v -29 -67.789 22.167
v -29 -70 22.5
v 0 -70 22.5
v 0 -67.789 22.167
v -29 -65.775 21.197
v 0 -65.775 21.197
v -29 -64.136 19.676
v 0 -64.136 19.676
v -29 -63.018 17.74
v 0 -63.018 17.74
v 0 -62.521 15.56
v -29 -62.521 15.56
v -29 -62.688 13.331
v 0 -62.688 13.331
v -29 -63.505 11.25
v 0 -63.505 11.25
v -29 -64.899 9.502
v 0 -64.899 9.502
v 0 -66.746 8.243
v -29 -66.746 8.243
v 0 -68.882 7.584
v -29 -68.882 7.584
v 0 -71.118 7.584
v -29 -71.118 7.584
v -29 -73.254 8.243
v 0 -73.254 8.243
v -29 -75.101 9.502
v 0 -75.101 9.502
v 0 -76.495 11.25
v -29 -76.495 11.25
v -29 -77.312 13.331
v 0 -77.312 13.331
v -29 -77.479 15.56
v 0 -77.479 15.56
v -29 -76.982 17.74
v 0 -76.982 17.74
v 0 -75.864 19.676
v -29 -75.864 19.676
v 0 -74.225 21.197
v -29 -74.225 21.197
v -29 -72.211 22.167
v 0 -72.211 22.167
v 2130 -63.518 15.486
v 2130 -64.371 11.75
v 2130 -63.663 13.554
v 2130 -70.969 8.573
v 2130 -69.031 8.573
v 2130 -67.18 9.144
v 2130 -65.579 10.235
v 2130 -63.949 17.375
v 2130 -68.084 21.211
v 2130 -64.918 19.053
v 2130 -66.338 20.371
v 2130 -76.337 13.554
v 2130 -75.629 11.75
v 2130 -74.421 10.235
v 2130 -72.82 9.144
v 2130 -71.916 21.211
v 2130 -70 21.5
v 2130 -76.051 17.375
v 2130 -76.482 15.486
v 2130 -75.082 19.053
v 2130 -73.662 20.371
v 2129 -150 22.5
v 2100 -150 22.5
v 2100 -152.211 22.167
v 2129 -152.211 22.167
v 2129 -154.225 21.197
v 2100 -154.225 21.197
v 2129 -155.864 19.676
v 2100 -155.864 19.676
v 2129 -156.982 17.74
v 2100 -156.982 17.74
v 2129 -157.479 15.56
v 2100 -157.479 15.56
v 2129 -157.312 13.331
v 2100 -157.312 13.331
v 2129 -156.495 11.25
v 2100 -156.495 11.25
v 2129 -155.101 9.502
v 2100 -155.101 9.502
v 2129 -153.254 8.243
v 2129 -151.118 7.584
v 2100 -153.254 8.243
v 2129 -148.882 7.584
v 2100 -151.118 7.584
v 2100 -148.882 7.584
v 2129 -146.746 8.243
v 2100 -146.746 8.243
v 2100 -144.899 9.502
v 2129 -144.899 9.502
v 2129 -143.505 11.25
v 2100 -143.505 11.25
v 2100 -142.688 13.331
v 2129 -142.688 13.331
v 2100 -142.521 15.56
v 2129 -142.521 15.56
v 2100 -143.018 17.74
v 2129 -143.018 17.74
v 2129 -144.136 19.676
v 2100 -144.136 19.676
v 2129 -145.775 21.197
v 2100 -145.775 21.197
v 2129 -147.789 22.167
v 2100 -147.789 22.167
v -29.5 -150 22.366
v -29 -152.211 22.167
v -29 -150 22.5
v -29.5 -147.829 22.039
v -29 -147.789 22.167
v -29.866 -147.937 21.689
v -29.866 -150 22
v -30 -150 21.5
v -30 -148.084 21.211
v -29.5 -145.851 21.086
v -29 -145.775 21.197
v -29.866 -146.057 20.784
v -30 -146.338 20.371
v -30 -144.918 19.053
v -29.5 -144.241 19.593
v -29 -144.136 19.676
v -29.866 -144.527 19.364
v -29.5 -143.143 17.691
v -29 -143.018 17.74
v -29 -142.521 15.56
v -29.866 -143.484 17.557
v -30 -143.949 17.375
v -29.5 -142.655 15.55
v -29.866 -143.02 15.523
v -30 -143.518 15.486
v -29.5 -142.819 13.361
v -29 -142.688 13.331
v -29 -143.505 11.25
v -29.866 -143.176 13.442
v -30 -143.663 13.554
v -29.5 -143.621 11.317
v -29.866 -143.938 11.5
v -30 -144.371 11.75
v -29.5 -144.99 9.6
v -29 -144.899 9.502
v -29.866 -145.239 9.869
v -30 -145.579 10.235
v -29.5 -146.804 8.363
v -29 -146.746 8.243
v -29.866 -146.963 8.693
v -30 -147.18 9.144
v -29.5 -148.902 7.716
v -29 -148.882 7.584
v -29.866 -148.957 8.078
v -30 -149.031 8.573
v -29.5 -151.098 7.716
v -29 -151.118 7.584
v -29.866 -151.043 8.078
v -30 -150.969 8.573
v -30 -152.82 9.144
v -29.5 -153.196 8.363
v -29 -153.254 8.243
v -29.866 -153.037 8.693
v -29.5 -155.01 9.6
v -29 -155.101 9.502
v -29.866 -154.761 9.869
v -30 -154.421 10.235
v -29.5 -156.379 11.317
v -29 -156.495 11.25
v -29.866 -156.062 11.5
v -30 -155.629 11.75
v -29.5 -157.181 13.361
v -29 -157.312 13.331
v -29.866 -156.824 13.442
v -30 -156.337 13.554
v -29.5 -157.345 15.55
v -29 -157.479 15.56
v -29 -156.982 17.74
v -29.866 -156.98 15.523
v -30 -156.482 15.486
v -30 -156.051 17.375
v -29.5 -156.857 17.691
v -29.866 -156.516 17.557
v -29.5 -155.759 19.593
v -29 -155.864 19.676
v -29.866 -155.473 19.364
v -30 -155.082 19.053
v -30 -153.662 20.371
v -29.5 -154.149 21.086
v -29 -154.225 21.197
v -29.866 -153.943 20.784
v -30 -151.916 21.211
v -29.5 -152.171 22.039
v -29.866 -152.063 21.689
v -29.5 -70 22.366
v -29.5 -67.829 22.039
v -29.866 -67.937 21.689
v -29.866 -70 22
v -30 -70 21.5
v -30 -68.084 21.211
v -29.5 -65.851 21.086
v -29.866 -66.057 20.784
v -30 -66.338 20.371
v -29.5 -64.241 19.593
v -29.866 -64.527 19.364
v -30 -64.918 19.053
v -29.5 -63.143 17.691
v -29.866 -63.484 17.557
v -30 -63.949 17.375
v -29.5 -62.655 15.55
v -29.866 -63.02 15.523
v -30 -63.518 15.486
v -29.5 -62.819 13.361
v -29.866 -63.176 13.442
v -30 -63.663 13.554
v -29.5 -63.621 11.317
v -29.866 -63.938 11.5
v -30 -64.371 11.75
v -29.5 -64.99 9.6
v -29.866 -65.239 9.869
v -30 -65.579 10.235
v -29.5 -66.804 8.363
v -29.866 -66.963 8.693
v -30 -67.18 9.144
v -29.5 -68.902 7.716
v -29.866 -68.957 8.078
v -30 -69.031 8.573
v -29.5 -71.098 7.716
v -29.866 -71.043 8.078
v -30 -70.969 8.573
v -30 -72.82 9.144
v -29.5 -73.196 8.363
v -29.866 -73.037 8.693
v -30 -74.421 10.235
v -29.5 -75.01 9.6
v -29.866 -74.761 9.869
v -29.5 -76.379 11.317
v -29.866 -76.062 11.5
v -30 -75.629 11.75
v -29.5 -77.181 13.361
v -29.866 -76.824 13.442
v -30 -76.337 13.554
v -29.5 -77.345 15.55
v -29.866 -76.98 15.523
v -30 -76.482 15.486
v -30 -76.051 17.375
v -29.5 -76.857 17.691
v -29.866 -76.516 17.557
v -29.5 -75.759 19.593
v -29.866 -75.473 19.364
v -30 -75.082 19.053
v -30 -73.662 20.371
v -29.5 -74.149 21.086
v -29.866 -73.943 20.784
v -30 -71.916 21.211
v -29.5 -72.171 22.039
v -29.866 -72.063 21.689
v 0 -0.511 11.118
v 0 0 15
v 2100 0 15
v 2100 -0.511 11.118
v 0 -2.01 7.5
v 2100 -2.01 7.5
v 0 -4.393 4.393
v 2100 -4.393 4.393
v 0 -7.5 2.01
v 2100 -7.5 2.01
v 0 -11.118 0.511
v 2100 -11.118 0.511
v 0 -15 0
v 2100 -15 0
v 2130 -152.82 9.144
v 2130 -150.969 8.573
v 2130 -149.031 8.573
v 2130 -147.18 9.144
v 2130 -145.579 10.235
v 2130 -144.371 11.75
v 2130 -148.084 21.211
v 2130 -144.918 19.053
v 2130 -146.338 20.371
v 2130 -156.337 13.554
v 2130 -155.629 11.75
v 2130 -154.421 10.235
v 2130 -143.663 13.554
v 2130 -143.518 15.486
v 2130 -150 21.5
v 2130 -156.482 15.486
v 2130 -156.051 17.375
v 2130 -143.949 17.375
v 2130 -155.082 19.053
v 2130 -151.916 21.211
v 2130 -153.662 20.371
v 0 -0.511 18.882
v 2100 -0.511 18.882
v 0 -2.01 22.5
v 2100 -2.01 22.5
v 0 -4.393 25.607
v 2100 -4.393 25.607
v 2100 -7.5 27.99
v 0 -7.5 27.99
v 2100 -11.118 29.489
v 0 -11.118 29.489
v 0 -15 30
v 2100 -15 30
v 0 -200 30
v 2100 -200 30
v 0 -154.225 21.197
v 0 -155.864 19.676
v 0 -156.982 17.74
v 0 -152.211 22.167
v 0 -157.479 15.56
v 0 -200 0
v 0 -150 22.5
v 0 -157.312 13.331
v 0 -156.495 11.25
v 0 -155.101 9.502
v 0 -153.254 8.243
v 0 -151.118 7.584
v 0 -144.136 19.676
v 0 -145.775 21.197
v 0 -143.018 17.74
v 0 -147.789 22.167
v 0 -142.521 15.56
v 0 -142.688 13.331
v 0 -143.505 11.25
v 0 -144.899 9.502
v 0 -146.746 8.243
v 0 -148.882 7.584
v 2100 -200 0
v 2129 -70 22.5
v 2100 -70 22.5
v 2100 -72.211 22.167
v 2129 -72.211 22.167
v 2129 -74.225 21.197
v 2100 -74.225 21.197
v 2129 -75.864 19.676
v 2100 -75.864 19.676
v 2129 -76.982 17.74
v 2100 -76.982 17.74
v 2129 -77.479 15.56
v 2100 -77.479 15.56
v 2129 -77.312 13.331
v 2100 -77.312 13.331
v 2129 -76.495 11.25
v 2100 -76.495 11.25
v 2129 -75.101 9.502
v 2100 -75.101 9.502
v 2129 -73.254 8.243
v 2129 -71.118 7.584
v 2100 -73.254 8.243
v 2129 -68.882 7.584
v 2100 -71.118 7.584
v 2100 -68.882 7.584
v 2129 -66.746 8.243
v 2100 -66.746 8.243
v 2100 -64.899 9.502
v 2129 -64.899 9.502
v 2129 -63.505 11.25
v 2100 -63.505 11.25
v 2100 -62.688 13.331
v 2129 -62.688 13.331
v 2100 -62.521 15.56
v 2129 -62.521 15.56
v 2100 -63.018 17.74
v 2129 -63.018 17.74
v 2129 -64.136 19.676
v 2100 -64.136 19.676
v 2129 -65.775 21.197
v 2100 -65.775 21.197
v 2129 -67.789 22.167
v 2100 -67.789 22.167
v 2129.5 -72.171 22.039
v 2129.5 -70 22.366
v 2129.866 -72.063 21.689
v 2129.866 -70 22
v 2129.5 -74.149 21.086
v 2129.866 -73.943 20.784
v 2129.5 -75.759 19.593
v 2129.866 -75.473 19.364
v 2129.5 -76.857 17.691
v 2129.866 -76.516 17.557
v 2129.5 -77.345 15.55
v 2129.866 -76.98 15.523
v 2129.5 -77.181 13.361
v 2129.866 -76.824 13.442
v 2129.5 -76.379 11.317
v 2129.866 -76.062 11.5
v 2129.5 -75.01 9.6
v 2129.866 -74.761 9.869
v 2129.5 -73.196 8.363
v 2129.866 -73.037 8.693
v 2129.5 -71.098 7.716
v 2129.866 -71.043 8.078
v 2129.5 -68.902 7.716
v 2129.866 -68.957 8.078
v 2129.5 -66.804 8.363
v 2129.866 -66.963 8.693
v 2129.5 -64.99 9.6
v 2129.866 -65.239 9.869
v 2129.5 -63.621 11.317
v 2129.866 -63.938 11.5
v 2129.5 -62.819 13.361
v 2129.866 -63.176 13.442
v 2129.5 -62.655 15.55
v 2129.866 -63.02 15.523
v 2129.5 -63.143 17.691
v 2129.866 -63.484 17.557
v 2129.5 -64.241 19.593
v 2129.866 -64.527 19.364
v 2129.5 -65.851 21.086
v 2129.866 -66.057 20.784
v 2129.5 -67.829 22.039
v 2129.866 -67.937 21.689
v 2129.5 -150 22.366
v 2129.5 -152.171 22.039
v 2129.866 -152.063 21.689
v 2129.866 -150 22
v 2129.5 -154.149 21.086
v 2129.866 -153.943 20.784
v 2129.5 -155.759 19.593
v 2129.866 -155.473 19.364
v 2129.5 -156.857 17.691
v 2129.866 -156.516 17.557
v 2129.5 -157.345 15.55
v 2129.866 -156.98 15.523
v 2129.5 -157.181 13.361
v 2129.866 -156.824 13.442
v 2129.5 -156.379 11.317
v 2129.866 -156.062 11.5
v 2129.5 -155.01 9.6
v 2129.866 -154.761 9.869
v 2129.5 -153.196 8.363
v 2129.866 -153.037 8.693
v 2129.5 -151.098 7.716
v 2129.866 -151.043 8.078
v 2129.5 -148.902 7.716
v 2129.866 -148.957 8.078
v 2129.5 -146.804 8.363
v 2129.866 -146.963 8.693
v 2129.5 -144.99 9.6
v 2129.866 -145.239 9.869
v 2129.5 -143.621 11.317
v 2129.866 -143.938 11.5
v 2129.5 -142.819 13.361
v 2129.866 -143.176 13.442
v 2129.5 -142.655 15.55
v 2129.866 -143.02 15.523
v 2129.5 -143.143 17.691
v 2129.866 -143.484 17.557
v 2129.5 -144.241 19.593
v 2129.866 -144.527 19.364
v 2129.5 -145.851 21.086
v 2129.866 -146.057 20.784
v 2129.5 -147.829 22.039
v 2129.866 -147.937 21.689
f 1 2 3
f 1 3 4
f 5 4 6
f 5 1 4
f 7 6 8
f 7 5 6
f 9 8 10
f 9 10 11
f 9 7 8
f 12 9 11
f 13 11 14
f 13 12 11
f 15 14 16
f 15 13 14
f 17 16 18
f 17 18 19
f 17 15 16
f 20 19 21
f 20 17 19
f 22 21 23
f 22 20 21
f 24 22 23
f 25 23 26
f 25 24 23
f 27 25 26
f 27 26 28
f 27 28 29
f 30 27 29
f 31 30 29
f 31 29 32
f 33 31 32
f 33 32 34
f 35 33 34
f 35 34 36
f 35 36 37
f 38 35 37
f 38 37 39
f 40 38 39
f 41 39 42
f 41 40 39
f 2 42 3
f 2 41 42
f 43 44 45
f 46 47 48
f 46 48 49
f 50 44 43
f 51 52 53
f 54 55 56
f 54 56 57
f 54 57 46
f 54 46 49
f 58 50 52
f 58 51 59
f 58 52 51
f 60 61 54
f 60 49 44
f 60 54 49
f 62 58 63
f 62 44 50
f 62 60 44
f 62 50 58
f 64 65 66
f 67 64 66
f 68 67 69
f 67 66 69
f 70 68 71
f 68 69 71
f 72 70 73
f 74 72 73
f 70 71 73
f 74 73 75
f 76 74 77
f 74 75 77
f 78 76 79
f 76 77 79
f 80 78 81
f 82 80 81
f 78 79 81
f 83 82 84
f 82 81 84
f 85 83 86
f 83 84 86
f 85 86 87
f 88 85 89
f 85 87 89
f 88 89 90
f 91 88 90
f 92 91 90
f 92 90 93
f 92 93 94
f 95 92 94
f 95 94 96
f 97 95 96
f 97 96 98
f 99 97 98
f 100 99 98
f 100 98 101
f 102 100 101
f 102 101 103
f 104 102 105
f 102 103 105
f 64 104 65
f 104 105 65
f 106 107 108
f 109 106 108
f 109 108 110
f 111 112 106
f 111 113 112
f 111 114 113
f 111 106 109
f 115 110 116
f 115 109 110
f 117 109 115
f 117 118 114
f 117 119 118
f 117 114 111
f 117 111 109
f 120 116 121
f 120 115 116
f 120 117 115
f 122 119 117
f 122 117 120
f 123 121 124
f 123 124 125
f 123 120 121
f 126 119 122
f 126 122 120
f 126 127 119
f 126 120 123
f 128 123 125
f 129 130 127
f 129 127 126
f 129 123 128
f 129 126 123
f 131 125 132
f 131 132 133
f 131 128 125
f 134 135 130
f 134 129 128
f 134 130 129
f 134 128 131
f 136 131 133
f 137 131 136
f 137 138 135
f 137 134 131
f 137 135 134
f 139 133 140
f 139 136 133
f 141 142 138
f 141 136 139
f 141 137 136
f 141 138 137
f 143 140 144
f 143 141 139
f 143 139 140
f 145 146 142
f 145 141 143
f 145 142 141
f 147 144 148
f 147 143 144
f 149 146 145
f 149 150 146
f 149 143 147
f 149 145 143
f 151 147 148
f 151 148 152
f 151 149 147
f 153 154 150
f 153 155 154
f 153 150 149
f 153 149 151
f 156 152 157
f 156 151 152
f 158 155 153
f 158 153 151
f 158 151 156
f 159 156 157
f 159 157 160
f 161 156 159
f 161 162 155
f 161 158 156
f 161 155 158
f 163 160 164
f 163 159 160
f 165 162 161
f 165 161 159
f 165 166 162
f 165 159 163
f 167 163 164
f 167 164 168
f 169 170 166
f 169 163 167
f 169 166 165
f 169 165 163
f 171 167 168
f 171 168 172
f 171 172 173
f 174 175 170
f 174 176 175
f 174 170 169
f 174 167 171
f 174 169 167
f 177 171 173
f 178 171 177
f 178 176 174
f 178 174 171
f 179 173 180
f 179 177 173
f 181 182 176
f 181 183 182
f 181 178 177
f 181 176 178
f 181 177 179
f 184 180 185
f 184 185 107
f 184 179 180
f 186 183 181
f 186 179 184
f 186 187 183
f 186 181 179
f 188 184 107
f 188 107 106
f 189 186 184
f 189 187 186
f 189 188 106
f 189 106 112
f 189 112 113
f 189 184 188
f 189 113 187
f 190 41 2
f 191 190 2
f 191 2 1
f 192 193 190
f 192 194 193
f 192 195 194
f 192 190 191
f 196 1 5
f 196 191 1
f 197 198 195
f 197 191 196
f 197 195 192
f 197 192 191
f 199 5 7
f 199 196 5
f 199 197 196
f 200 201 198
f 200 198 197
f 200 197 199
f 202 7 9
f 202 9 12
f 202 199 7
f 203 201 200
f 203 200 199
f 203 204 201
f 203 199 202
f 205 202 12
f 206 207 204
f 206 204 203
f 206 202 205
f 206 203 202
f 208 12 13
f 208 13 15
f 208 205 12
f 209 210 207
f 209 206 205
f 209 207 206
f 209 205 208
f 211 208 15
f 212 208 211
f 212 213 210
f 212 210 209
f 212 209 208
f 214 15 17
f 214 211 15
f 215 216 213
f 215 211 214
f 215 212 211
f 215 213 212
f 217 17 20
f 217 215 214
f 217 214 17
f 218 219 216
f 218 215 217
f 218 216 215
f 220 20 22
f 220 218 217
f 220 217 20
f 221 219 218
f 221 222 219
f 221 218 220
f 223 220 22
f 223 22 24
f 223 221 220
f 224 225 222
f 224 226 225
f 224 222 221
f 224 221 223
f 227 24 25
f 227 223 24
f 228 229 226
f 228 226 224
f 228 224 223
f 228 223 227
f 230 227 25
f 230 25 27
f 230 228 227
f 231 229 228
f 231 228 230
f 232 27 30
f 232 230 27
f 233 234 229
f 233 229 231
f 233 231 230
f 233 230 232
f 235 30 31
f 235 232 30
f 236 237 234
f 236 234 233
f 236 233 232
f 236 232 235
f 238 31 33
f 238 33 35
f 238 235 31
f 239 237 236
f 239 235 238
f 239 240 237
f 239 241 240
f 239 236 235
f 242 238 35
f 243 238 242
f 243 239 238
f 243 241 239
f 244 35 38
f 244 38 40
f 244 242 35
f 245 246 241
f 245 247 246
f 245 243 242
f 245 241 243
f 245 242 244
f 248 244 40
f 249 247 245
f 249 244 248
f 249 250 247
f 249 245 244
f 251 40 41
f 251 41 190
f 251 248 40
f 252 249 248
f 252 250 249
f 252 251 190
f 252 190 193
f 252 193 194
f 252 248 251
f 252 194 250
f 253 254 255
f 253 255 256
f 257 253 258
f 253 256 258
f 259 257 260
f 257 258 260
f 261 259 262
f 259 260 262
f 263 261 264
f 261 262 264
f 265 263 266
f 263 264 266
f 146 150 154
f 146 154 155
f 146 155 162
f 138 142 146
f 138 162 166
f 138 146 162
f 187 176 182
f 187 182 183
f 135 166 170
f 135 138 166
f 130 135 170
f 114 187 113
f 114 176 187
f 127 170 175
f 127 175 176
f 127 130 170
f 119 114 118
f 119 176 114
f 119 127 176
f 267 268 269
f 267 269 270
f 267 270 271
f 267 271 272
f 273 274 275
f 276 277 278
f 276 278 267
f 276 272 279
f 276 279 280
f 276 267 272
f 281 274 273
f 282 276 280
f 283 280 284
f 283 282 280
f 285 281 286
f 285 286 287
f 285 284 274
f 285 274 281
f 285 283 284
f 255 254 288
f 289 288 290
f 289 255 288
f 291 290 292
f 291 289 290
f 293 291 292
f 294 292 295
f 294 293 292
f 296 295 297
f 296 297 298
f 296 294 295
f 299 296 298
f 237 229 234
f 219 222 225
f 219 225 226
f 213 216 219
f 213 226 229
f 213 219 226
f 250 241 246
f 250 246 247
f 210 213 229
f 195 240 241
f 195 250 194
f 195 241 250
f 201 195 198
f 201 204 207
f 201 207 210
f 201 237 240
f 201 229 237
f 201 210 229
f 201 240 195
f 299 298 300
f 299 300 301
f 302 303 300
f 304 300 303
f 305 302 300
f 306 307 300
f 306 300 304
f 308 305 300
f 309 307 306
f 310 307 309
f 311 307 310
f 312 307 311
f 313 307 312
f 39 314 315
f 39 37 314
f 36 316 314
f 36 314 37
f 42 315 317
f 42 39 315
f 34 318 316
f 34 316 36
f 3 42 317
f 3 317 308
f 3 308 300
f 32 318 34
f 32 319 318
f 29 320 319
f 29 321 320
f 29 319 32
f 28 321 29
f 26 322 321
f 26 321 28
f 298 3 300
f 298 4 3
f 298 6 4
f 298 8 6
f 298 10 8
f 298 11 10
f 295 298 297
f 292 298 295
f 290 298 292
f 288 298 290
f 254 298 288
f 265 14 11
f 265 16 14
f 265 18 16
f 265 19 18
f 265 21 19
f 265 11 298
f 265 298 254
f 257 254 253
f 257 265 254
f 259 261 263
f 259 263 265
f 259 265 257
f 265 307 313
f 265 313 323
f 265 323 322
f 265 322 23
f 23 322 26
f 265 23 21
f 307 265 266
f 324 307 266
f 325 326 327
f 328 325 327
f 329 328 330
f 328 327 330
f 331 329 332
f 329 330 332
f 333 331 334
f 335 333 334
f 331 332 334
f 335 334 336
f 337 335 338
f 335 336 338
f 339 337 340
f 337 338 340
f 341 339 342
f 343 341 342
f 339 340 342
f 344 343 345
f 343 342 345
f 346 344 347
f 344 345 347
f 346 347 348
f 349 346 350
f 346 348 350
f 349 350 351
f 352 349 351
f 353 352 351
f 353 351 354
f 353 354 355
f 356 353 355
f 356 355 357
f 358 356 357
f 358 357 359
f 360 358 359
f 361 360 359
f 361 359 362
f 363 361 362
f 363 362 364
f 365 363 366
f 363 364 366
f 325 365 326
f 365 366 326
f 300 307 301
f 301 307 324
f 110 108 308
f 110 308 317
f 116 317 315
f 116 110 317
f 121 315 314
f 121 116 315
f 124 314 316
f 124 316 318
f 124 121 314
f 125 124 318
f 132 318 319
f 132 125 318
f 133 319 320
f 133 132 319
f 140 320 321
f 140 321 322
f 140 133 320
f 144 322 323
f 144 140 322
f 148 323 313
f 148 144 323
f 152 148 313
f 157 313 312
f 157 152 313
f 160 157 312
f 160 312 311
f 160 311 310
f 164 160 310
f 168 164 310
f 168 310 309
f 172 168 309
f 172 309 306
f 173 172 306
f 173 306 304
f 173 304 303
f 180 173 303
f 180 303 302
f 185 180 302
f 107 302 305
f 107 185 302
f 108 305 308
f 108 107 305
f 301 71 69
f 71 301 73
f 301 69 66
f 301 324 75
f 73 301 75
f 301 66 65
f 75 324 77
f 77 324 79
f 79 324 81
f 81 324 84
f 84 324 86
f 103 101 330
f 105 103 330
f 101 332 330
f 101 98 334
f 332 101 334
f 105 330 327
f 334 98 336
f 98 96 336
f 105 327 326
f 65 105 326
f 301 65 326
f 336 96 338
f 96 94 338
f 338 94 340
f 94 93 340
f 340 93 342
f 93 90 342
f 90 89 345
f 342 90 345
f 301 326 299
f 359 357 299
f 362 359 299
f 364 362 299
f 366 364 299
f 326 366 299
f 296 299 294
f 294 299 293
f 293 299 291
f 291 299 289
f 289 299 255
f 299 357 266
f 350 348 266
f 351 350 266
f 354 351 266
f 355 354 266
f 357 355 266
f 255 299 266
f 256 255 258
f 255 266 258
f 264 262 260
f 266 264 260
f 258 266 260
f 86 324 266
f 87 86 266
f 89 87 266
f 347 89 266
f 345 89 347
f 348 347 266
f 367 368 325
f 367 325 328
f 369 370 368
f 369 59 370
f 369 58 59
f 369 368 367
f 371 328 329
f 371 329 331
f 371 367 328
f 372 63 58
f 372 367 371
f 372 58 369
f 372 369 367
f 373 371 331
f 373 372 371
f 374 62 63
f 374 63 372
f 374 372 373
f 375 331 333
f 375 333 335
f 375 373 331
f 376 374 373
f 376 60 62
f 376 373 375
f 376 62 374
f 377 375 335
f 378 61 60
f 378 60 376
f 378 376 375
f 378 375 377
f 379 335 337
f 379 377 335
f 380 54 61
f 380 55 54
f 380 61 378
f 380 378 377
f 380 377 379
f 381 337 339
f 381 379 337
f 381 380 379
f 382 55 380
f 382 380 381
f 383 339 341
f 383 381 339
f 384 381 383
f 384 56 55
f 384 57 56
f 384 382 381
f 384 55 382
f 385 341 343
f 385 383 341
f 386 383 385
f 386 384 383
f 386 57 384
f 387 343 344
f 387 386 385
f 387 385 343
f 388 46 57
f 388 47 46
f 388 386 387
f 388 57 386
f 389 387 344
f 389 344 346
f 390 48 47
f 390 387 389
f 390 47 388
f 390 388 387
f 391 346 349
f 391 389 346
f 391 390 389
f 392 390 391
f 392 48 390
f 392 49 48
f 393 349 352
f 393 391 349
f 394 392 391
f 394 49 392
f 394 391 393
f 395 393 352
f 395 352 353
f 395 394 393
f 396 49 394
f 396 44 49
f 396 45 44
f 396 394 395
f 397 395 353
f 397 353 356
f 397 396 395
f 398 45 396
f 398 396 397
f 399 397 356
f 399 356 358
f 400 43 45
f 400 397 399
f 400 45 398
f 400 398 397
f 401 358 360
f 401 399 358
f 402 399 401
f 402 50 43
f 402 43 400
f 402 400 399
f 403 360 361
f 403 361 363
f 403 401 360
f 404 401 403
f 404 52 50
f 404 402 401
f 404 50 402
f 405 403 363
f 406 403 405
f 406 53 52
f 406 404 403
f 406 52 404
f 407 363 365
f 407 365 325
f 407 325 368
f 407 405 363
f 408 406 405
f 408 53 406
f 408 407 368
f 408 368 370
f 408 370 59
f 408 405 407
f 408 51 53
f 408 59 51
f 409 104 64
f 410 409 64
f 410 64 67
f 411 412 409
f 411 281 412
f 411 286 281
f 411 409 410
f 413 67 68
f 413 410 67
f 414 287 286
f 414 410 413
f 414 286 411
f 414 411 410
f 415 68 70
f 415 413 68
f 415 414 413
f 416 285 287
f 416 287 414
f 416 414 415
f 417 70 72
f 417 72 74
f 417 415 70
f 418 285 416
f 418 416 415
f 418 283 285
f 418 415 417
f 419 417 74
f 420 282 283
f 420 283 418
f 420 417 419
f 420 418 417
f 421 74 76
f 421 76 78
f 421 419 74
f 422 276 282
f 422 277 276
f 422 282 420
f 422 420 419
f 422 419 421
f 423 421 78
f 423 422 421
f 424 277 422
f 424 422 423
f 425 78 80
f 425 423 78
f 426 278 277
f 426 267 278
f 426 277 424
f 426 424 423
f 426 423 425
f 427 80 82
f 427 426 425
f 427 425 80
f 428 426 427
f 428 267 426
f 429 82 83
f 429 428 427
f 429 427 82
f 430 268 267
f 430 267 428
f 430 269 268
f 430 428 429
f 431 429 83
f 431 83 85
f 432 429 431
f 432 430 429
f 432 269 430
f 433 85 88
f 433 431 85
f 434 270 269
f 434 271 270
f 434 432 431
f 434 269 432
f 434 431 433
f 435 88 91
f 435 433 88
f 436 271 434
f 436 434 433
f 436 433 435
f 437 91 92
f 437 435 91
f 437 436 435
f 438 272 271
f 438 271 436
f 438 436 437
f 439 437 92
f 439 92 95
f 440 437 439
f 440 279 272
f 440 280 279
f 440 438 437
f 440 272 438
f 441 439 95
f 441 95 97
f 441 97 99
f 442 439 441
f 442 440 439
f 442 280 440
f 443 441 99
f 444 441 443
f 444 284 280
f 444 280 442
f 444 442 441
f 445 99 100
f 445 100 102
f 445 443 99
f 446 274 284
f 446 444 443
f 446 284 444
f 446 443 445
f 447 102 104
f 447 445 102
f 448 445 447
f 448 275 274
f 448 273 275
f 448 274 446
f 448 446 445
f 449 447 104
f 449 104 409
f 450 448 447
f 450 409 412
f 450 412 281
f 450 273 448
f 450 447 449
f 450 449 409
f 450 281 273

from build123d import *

# Parameters (mm, degrees)
SCHIZZO1_W                   = 2100
SCHIZZO1_H                   = 200
ESTRUSIONE_ESTRUSIONE1_DEPTH = 30
RACCORDO1_R                  = 15
SCHIZZO3_R                   = 7.5
ESTRUSIONE_ESTRUSIONE2_DEPTH = 30
RACCORDO2_R                  = 1
ESTRUSIONE_ESTRUSIONE3_START = 30
SCHIZZO4_R                   = 7.5
ESTRUSIONE_ESTRUSIONE3_DEPTH = 30
RACCORDO3_R                  = 1


with BuildPart() as part:
    # Schizzo1 → Estrusione-Estrusione1 (new body)
    with BuildSketch(Plane.XY):
        with Locations((1050, -100)):
            Rectangle(SCHIZZO1_W, SCHIZZO1_H)
    extrude(amount=ESTRUSIONE_ESTRUSIONE1_DEPTH)

    # Raccordo1
    raccordo1_edges = [part.edges().sort_by_distance(p)[0] for p in [
        (1050, 0, 0),
        (1050, 0, 30),
    ]]
    fillet(raccordo1_edges, radius=RACCORDO1_R - 0.0001)  # a hair under: the kernel refuses the full size

    # Schizzo3 → Estrusione-Estrusione2 (add)
    with BuildSketch(Plane(origin=(2100, 0, 0), x_dir=(0, 0, -1), z_dir=(1, 0, 0))):
        with Locations(Location((-15, -70, 0), (0, 0, 180))):
            Circle(SCHIZZO3_R)
        with Locations(Location((-15, -150, 0), (0, 0, 180))):
            Circle(SCHIZZO3_R)
    extrude(amount=ESTRUSIONE_ESTRUSIONE2_DEPTH)

    # Raccordo2
    raccordo2_edges = [part.edges().sort_by_distance(p)[0] for p in [
        (2130, -70, 7.5),
        (2130, -150, 7.5),
    ]]
    fillet(raccordo2_edges, radius=RACCORDO2_R)

    # Schizzo4 → Estrusione-Estrusione3 (add)
    with BuildSketch(Plane.ZY.offset(ESTRUSIONE_ESTRUSIONE3_START)):
        with Locations((15, -70)):
            Circle(SCHIZZO4_R)
        with Locations((15, -150)):
            Circle(SCHIZZO4_R)
    extrude(amount=-ESTRUSIONE_ESTRUSIONE3_DEPTH)

    # Raccordo3
    raccordo3_edges = [part.edges().sort_by_distance(p)[0] for p in [
        (-30, -70, 7.5),
        (-30, -150, 7.5),
    ]]
    fillet(raccordo3_edges, radius=RACCORDO3_R)


solid = part.part
